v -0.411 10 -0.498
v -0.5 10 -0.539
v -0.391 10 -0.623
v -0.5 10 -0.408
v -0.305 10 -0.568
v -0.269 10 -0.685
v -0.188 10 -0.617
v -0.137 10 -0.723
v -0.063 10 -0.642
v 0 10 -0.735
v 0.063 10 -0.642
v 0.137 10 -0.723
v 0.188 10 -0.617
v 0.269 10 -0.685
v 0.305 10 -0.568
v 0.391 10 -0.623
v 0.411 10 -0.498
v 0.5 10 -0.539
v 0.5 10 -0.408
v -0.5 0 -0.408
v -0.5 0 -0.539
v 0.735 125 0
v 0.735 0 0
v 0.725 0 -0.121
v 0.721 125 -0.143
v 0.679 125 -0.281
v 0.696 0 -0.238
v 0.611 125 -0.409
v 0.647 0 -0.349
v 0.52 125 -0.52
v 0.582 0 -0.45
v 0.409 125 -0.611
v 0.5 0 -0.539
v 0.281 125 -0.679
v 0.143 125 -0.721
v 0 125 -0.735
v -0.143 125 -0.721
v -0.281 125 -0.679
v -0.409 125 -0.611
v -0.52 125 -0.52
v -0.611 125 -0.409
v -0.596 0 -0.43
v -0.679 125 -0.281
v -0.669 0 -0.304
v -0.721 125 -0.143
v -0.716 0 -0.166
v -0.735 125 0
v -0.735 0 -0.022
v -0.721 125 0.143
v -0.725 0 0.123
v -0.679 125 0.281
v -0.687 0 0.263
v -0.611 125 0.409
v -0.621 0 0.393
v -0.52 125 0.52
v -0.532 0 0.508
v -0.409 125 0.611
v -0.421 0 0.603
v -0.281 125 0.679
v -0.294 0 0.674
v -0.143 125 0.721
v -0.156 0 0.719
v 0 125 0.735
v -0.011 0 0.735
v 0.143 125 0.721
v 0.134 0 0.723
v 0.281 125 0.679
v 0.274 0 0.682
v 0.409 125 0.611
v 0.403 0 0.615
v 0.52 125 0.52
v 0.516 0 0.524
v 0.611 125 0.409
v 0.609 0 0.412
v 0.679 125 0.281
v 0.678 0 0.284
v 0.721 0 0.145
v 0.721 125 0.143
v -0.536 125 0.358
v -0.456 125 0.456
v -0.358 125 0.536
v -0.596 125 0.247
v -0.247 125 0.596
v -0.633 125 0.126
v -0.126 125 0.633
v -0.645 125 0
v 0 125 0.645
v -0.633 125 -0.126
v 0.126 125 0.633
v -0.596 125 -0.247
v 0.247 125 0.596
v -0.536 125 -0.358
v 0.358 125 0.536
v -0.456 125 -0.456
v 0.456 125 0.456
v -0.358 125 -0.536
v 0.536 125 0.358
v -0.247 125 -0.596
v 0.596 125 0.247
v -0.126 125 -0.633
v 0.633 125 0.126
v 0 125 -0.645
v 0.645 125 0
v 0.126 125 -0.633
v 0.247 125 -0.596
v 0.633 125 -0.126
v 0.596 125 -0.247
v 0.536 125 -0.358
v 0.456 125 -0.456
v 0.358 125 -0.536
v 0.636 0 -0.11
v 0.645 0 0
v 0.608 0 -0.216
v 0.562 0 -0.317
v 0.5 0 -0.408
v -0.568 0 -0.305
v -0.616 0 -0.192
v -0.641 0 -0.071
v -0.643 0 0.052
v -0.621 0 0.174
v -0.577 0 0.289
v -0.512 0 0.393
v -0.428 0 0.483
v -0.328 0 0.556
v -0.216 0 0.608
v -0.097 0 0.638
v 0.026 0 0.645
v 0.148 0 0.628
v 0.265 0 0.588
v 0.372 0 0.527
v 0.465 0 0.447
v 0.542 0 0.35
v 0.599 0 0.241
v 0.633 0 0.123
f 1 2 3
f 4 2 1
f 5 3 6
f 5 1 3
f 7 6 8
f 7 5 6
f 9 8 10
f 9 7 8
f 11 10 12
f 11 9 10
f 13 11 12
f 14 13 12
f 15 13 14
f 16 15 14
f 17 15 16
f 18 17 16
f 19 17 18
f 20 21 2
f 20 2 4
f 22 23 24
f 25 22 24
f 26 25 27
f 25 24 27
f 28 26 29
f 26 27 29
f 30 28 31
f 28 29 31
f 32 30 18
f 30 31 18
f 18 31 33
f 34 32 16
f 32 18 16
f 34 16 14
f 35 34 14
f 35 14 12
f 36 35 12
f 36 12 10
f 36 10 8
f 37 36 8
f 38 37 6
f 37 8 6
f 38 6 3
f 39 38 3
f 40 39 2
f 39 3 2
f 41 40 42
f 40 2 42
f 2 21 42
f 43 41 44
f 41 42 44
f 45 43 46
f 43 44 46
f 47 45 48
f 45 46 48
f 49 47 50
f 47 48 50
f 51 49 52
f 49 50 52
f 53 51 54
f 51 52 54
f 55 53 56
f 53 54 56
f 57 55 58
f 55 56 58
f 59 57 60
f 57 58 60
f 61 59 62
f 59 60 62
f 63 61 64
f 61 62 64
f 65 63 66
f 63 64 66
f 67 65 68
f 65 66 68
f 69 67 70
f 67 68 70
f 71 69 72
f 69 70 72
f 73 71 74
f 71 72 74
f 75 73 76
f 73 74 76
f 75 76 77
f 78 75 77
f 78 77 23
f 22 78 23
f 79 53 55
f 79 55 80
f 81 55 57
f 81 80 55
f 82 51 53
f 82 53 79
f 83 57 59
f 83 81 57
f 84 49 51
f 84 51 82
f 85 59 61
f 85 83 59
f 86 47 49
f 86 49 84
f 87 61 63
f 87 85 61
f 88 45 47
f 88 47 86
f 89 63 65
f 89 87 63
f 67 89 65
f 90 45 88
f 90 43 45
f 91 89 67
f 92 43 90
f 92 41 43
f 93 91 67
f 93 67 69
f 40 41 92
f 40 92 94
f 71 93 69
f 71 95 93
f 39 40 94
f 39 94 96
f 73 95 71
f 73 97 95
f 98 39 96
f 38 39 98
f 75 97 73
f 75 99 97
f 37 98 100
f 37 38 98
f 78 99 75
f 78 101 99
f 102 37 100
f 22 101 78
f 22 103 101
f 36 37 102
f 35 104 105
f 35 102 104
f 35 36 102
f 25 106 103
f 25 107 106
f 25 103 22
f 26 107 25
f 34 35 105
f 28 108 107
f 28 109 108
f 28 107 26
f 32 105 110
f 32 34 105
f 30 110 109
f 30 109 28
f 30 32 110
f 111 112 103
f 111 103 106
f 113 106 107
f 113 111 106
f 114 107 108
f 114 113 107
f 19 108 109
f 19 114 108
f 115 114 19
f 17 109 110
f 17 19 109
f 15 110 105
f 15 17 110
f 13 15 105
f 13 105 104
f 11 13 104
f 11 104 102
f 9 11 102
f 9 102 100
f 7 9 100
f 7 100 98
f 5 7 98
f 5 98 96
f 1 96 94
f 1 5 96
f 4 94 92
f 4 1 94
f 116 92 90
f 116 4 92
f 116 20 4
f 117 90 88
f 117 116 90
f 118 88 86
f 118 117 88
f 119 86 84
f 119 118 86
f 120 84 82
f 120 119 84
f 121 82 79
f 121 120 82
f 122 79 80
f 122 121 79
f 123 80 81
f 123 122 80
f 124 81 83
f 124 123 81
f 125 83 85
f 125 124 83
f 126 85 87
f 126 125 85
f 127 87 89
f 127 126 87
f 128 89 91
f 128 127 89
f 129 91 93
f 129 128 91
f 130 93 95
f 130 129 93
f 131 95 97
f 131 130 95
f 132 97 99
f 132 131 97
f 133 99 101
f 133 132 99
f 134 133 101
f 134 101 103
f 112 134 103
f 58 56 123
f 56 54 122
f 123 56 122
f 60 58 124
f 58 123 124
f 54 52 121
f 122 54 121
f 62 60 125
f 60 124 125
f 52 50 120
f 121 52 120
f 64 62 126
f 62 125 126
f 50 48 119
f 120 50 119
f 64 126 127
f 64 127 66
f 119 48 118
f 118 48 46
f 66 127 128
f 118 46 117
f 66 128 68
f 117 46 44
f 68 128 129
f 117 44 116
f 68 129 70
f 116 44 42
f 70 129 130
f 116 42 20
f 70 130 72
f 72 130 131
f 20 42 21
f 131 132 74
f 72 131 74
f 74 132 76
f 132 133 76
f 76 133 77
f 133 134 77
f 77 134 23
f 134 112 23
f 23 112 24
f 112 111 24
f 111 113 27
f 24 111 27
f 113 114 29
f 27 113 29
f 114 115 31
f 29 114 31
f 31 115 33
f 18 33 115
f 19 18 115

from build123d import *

# Parameters (mm, degrees)
SKETCH1_R           = 0.73533
SKETCH1_R_2         = 0.64516
BOSS_EXTRUDE1_DEPTH = 125
SKETCH2_W           = 1
SKETCH2_H           = 0.344184039
CUT_EXTRUDE1_DEPTH  = 10


with BuildPart() as part:
    # Sketch1 → Boss-Extrude1 (new body)
    with BuildSketch(Plane(origin=(0, 0, 0), x_dir=(1, 0, 0), z_dir=(0, 1, 0))):
        Circle(SKETCH1_R)
        Circle(SKETCH1_R_2, mode=Mode.SUBTRACT)
    extrude(amount=BOSS_EXTRUDE1_DEPTH)

    # Sketch2 → Cut-Extrude1 (cut)
    with BuildSketch(Plane.XZ):
        with Locations((0, -0.563237981)):
            Rectangle(SKETCH2_W, SKETCH2_H)
    extrude(amount=-CUT_EXTRUDE1_DEPTH, mode=Mode.SUBTRACT)


solid = part.part
